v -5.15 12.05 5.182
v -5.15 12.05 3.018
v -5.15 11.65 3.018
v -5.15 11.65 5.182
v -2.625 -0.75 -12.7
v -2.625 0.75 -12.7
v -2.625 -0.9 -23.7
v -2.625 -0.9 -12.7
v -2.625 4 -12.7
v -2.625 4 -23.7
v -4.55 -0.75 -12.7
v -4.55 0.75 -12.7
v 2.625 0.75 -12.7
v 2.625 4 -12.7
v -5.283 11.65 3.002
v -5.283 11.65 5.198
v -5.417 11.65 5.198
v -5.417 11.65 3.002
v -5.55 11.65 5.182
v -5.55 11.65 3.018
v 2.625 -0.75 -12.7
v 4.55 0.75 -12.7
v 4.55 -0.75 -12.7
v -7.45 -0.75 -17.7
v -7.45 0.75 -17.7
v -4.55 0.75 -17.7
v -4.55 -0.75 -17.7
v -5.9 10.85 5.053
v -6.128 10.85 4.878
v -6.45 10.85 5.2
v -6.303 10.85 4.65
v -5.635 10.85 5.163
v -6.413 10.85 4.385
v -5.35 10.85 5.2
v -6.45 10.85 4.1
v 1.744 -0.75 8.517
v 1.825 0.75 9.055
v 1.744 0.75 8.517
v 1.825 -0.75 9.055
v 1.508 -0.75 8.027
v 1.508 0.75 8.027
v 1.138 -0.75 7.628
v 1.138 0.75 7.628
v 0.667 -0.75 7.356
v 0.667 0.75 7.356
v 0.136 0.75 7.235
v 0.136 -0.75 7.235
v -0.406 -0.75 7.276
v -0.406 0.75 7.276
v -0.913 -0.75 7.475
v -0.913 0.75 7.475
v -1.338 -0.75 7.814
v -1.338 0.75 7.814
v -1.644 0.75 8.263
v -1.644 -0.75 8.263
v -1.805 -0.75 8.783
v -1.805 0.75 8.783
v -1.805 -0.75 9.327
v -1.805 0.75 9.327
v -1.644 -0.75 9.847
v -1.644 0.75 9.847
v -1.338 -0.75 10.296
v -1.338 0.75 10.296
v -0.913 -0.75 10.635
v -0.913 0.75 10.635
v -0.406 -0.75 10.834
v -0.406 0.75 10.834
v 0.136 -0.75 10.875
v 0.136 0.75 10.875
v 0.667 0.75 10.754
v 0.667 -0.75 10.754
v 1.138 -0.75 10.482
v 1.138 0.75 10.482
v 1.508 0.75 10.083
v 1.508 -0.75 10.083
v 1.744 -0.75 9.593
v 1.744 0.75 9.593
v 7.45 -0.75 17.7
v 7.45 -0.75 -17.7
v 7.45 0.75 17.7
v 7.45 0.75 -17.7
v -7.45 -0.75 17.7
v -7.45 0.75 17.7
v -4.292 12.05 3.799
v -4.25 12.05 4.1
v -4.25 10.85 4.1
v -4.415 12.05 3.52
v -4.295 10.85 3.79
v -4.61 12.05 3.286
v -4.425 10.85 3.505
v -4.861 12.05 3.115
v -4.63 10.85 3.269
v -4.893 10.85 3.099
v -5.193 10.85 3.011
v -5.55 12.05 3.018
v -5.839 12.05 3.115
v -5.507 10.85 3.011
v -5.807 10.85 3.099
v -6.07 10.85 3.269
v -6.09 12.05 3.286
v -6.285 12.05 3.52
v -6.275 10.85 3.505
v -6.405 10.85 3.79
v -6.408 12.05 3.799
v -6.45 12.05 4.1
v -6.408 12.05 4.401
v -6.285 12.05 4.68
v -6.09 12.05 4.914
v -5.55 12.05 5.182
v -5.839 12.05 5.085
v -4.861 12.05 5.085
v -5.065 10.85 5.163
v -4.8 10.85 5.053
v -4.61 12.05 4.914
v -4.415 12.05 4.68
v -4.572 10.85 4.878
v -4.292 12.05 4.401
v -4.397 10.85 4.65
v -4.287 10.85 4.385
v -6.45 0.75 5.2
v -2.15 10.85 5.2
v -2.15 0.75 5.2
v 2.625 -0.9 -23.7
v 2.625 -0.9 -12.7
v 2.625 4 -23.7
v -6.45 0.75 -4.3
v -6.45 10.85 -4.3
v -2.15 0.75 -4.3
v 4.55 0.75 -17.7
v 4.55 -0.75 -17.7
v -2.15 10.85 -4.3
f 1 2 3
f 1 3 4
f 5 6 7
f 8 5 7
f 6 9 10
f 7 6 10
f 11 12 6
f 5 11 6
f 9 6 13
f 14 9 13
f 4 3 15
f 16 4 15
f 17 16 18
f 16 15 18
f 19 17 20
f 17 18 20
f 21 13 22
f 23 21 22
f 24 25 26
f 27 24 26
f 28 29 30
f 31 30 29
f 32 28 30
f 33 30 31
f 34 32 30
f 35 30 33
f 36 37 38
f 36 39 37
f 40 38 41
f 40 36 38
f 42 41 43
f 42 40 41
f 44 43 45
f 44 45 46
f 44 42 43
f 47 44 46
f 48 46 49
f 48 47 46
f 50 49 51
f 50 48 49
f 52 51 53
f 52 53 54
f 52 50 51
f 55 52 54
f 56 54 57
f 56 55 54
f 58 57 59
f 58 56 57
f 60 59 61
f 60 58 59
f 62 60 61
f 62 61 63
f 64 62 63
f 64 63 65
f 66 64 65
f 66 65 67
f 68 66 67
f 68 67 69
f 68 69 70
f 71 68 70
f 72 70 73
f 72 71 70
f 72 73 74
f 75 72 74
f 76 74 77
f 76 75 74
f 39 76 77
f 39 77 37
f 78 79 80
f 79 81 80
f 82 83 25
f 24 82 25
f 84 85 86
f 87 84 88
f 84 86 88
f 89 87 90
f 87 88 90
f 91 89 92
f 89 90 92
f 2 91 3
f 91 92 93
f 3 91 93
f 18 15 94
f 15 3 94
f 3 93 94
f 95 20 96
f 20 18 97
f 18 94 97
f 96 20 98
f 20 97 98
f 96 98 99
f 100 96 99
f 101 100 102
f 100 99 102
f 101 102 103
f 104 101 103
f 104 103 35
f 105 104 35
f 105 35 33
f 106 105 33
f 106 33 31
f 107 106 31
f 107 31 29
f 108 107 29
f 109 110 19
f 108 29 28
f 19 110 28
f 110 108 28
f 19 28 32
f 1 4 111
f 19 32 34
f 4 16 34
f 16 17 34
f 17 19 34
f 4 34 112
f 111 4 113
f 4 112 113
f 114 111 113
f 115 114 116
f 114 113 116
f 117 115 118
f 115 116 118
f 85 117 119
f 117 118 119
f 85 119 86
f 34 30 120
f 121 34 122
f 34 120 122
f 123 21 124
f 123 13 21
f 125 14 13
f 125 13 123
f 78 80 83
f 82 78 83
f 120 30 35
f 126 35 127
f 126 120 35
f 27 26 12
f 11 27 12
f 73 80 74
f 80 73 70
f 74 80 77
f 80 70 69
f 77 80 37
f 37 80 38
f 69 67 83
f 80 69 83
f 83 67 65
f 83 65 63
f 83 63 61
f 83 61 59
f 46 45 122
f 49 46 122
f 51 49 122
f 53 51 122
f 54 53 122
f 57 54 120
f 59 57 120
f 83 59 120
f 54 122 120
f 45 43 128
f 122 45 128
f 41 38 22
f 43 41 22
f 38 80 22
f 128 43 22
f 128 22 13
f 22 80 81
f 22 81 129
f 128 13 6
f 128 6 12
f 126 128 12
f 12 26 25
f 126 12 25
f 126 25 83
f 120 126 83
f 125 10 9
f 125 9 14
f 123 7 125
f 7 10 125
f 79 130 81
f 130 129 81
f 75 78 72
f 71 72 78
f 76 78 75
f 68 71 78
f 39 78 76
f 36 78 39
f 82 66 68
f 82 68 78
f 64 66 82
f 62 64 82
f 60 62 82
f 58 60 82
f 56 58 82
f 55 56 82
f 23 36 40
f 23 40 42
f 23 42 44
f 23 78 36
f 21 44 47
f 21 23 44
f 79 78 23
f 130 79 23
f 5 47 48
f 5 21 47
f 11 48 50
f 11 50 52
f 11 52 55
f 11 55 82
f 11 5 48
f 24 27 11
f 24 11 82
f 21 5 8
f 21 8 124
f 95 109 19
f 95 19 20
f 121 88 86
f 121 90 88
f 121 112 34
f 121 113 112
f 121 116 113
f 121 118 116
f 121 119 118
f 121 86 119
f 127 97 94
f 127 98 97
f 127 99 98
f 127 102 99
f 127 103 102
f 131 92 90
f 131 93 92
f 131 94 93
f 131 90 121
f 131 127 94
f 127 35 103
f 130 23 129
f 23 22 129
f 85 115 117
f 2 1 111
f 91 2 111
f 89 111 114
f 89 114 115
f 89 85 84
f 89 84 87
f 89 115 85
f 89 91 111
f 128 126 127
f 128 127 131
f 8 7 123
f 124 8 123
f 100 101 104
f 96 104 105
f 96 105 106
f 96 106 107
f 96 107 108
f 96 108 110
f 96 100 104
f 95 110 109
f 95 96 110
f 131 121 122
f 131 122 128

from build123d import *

# Parameters (mm, degrees)
SKETCH1_R                = 1.825
BOSS_EXTRUDE1_DEPTH      = 0.75
BOSS_EXTRUDE2_DEPTH      = 4
BOSS_EXTRUDE2_DEPTH_BACK = 0.9
SKETCH1_4_W              = 5.25
SKETCH1_4_H              = 11
SKETCH2_W                = 4.3
SKETCH2_H                = 9.5
BOSS_EXTRUDE3_DEPTH      = 10.1
SKETCH3_R                = 1.1
BOSS_EXTRUDE4_DEPTH      = 1.2
CUT_EXTRUDE1_START       = -0.4
CUT_EXTRUDE1_DEPTH       = 0.4


with BuildPart() as part:
    # Sketch1 → Boss-Extrude1 (new, symmetric)
    with BuildSketch(Plane(origin=(0, 0, 0), x_dir=(1, 0, 0), z_dir=(0, 1, 0))):
        Polygon((7.45, -17.7), (7.45, 17.7), (4.55, 17.7), (4.55, 12.7), (2.625, 12.7), (-2.625, 12.7), (-4.55, 12.7), (-4.55, 17.7), (-7.45, 17.7), (-7.45, -17.7), align=None)
        with Locations((0, -9.055)):
            Circle(SKETCH1_R, mode=Mode.SUBTRACT)
    extrude(amount=BOSS_EXTRUDE1_DEPTH, both=True)

    # Sketch1<4> → Boss-Extrude2 (add, two sides: drawn at the far end of the back side and taken through both)
    with BuildSketch(Plane(origin=(0, 0, 0), x_dir=(1, 0, 0), z_dir=(0, 1, 0)).offset(-BOSS_EXTRUDE2_DEPTH_BACK)):
        with Locations((0, 18.2)):
            Rectangle(SKETCH1_4_W, SKETCH1_4_H)
    extrude(amount=BOSS_EXTRUDE2_DEPTH + BOSS_EXTRUDE2_DEPTH_BACK)

    # Sketch2 → Boss-Extrude3 (add)
    with BuildSketch(Plane(origin=(0, 0.75, 0), x_dir=(1, 0, 0), z_dir=(0, 1, 0))):
        with Locations((-4.3, -0.45)):
            Rectangle(SKETCH2_W, SKETCH2_H)
    extrude(amount=BOSS_EXTRUDE3_DEPTH)

    # Sketch3 → Boss-Extrude4 (add)
    with BuildSketch(Plane(origin=(0, 10.85, 0), x_dir=(1, 0, 0), z_dir=(0, 1, 0))):
        with Locations((-5.35, -4.1)):
            Circle(SKETCH3_R)
    extrude(amount=BOSS_EXTRUDE4_DEPTH)

    # Sketch4 → Cut-Extrude1 (cut)
    with BuildSketch(Plane(origin=(0, 12.05, 0), x_dir=(1, 0, 0), z_dir=(0, 1, 0)).offset(CUT_EXTRUDE1_START)):
        with BuildLine():
            Line((-5.15, -3.018334617), (-5.15, -5.181665383))
            ThreePointArc((-5.15, -5.181665383), (-5.35, -5.2), (-5.55, -5.181665383))
            Line((-5.55, -5.181665383), (-5.55, -3.018334617))
            ThreePointArc((-5.55, -3.018334617), (-5.35, -3), (-5.15, -3.018334617))
        make_face()
    extrude(amount=CUT_EXTRUDE1_DEPTH, mode=Mode.SUBTRACT)


solid = part.part
